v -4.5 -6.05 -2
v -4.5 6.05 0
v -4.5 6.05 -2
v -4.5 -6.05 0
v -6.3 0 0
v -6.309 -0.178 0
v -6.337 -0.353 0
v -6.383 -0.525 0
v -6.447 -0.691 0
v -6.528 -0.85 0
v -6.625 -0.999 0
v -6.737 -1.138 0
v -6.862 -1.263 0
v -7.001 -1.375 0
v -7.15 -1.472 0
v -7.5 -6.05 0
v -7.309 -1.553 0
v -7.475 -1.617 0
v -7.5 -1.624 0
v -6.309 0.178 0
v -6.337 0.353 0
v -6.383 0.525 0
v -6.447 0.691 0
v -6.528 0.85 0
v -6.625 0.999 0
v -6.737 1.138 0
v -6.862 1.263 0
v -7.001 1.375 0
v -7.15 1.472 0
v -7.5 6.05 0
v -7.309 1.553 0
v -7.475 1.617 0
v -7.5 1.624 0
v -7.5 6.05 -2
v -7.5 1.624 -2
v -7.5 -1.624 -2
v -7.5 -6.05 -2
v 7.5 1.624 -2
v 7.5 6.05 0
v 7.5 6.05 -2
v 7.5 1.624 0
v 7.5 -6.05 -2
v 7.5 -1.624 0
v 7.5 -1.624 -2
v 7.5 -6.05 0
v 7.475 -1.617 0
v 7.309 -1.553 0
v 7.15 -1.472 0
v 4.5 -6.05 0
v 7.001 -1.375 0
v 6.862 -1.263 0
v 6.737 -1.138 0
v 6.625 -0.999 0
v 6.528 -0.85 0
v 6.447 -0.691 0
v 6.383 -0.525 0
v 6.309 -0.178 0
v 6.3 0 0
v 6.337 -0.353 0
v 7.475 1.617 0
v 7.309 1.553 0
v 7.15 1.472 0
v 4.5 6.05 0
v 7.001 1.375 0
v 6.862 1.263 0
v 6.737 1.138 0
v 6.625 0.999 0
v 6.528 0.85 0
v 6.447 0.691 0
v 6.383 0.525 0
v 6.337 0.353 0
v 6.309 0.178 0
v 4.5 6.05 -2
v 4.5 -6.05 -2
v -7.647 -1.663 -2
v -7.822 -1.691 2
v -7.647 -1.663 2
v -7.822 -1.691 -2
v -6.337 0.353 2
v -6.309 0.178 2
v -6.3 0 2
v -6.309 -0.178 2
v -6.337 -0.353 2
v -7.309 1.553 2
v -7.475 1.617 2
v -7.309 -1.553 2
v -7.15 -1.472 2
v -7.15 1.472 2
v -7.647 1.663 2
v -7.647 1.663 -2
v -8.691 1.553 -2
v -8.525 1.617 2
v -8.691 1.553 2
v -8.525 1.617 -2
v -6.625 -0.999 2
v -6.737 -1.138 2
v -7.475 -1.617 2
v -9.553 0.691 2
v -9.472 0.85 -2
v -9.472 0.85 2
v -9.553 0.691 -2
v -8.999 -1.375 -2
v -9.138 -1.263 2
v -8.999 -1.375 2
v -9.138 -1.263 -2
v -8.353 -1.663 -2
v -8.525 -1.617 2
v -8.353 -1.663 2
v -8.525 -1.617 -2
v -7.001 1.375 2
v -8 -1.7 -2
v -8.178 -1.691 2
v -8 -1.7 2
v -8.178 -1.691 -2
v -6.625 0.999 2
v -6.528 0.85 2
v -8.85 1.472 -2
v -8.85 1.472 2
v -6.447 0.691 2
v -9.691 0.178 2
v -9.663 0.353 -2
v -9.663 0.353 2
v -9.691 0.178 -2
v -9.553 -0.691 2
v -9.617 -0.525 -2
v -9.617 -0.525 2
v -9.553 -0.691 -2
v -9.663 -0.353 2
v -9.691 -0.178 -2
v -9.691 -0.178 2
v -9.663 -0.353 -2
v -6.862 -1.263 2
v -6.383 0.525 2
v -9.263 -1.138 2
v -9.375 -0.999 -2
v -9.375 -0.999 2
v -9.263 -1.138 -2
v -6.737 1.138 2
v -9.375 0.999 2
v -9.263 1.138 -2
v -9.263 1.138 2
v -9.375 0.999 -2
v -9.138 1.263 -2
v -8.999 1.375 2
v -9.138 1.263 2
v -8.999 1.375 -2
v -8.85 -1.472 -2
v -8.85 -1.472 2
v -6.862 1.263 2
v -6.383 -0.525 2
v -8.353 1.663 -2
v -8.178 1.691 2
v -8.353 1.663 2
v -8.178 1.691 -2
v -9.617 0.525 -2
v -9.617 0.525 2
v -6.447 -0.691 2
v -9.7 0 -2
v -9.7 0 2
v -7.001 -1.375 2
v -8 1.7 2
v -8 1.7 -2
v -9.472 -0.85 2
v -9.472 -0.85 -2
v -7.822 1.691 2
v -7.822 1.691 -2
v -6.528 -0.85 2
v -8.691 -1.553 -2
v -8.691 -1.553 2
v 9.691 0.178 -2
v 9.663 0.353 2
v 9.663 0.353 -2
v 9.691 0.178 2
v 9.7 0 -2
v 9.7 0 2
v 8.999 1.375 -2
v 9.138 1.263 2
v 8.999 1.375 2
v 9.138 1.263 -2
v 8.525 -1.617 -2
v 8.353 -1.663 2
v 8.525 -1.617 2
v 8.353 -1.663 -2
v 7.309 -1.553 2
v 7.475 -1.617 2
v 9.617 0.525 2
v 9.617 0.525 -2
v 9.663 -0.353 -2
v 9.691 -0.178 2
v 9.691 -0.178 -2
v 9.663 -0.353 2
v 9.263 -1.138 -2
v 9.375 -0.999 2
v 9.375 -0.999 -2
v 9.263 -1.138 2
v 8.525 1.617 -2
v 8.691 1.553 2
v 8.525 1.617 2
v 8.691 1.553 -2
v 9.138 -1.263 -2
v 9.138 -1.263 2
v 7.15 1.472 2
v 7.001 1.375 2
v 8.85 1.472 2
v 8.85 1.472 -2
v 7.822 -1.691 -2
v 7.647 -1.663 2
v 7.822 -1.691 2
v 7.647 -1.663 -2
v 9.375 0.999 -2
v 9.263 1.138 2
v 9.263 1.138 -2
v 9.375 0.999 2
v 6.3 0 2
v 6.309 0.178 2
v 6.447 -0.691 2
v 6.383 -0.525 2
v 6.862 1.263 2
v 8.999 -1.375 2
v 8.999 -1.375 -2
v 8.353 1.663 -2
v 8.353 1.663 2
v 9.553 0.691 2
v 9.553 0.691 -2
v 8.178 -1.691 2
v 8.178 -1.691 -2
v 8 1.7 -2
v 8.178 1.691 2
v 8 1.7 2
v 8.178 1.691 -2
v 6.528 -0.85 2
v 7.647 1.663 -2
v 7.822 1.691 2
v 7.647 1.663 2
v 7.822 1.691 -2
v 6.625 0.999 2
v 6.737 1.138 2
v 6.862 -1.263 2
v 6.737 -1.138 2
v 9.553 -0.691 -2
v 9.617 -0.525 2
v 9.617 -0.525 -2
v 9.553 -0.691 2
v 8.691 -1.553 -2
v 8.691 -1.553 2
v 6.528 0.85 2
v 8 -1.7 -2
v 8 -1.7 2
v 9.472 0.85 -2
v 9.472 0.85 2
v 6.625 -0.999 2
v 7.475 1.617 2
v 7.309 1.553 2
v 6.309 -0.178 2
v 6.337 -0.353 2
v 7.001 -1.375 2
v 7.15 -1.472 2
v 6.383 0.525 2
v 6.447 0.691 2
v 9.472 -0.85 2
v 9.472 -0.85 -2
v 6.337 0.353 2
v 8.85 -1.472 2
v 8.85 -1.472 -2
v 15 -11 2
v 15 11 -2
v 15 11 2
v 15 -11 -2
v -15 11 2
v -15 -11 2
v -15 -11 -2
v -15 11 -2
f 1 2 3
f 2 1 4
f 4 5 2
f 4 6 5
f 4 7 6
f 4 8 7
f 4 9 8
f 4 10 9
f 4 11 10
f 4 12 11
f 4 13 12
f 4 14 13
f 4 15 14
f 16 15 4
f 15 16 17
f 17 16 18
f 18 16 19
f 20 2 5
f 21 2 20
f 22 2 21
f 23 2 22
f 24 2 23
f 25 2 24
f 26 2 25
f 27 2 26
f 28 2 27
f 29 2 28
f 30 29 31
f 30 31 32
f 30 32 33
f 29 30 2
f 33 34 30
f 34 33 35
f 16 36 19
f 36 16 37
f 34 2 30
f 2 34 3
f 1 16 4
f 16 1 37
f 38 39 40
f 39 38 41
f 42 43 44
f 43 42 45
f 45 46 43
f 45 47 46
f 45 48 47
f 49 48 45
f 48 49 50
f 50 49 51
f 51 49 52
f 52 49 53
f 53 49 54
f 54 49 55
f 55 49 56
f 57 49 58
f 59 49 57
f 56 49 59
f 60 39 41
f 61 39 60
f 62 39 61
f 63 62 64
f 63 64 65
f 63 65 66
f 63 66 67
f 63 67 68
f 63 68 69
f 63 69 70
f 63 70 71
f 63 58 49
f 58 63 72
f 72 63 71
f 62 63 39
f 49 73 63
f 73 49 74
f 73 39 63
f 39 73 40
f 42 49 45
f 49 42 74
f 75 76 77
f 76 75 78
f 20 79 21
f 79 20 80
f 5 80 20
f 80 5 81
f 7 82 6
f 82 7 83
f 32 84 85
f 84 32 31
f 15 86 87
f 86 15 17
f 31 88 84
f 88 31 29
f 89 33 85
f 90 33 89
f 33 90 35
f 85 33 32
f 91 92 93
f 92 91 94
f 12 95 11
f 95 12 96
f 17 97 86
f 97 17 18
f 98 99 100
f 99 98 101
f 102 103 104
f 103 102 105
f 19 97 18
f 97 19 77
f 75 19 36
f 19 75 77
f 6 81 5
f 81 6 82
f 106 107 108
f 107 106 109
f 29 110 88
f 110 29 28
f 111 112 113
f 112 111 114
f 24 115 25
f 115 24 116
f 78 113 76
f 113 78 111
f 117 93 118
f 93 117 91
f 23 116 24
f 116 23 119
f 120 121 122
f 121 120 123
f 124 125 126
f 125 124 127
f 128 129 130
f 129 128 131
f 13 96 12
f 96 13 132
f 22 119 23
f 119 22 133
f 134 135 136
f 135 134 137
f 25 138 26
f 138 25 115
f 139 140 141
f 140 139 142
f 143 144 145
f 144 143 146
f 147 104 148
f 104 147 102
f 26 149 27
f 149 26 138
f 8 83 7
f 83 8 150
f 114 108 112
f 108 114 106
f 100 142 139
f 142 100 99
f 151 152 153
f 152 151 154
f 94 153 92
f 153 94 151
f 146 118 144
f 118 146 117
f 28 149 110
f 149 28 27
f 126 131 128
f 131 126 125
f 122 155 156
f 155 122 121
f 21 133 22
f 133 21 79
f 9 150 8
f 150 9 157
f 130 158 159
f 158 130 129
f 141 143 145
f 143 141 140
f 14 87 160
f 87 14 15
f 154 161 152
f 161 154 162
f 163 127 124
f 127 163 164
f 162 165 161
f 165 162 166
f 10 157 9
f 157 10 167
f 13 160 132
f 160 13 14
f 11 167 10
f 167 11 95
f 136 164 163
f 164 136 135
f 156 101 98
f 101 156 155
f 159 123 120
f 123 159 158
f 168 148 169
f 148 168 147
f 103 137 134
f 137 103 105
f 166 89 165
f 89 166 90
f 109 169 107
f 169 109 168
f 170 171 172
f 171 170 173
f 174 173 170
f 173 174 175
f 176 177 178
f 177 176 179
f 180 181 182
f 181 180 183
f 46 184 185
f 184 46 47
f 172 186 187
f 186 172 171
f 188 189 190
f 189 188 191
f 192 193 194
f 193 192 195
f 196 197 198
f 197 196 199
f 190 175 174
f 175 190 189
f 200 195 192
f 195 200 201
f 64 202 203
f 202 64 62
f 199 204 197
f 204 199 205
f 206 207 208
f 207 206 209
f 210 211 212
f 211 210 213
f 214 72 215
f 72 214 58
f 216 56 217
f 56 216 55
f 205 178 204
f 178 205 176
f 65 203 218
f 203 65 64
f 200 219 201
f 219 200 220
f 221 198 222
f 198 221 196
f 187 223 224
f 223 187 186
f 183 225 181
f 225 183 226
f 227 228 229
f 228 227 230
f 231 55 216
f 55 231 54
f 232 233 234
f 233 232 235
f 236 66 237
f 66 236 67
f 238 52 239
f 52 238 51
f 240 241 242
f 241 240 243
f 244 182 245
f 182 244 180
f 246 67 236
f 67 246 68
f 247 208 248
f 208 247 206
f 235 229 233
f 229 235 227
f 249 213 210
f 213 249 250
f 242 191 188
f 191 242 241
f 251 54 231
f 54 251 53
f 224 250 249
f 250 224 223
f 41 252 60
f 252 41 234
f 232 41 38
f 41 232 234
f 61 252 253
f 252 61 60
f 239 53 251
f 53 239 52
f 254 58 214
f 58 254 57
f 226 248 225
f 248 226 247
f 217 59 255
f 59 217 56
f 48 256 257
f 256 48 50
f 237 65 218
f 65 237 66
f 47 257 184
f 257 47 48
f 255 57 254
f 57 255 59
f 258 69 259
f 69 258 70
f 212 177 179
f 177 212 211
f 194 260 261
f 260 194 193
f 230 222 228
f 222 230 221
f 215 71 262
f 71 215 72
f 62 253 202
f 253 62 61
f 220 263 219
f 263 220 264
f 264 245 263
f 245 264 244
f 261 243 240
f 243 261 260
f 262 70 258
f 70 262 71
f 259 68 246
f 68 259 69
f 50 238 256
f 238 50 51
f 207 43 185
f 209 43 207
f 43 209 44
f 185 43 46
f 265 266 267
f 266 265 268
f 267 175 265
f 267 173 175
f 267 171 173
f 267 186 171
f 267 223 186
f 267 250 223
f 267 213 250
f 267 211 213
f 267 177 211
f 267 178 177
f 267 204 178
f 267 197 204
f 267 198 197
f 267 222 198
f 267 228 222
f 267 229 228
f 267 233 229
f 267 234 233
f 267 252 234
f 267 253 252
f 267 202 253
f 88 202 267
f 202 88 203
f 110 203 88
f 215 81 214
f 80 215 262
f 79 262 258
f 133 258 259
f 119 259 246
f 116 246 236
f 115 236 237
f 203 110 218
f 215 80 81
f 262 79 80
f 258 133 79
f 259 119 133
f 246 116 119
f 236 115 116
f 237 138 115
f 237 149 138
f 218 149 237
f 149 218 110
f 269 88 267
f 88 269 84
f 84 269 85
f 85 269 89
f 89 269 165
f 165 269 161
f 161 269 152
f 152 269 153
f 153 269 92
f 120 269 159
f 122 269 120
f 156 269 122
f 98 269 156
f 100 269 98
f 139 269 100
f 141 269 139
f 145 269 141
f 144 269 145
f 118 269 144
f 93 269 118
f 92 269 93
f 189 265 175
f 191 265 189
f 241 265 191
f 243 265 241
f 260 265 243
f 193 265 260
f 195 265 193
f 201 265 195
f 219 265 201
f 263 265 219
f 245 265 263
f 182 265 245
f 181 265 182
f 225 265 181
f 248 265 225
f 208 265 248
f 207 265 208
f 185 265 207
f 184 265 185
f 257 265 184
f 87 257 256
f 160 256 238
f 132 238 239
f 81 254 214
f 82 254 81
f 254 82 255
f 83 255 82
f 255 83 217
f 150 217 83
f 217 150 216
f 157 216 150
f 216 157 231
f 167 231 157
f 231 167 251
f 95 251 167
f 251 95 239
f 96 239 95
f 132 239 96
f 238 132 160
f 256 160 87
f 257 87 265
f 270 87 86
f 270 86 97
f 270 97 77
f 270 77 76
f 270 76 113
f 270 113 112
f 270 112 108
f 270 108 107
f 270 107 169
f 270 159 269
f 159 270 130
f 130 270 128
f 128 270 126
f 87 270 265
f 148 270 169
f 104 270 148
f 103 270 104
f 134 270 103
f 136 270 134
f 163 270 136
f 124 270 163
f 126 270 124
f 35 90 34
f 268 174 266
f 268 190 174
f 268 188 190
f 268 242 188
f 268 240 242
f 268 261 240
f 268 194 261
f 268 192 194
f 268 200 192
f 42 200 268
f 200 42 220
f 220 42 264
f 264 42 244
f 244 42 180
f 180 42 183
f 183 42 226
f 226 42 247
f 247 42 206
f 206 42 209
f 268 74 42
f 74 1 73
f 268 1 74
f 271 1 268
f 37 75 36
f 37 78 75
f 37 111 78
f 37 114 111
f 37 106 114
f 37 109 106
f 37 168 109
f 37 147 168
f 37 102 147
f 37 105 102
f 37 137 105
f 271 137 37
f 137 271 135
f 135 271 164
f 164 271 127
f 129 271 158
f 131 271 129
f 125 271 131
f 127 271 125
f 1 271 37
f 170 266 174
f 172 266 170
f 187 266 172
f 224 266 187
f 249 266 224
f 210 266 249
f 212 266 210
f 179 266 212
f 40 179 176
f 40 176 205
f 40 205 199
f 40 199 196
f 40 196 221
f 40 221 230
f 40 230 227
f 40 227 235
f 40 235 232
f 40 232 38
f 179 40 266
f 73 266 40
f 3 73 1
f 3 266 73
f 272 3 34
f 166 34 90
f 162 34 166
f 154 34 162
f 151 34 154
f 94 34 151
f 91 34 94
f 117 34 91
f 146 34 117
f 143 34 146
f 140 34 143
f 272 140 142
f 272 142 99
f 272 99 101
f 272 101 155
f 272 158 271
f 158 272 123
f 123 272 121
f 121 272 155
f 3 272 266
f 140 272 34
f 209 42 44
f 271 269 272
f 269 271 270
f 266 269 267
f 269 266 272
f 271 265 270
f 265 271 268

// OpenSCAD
// Cable-tie base with two strap slots.
$fn = 60;
eps = 0.02;
base_w = 22;
base_l = 30;
base_t = 4;
slot_w = 3;
slot_l = 12;
difference() {
    cube([base_l,base_w,base_t],center=true);
    for (x=[-slot_l/2,slot_l/2]) translate([x,0,-base_t/2-eps]) cube([slot_w,base_w*0.55,base_t+2*eps],center=true);
    for (x=[-base_l/2+7,base_l/2-7]) translate([x,0,-base_t/2-eps]) cylinder(d=3.4,h=base_t+2*eps);
}
